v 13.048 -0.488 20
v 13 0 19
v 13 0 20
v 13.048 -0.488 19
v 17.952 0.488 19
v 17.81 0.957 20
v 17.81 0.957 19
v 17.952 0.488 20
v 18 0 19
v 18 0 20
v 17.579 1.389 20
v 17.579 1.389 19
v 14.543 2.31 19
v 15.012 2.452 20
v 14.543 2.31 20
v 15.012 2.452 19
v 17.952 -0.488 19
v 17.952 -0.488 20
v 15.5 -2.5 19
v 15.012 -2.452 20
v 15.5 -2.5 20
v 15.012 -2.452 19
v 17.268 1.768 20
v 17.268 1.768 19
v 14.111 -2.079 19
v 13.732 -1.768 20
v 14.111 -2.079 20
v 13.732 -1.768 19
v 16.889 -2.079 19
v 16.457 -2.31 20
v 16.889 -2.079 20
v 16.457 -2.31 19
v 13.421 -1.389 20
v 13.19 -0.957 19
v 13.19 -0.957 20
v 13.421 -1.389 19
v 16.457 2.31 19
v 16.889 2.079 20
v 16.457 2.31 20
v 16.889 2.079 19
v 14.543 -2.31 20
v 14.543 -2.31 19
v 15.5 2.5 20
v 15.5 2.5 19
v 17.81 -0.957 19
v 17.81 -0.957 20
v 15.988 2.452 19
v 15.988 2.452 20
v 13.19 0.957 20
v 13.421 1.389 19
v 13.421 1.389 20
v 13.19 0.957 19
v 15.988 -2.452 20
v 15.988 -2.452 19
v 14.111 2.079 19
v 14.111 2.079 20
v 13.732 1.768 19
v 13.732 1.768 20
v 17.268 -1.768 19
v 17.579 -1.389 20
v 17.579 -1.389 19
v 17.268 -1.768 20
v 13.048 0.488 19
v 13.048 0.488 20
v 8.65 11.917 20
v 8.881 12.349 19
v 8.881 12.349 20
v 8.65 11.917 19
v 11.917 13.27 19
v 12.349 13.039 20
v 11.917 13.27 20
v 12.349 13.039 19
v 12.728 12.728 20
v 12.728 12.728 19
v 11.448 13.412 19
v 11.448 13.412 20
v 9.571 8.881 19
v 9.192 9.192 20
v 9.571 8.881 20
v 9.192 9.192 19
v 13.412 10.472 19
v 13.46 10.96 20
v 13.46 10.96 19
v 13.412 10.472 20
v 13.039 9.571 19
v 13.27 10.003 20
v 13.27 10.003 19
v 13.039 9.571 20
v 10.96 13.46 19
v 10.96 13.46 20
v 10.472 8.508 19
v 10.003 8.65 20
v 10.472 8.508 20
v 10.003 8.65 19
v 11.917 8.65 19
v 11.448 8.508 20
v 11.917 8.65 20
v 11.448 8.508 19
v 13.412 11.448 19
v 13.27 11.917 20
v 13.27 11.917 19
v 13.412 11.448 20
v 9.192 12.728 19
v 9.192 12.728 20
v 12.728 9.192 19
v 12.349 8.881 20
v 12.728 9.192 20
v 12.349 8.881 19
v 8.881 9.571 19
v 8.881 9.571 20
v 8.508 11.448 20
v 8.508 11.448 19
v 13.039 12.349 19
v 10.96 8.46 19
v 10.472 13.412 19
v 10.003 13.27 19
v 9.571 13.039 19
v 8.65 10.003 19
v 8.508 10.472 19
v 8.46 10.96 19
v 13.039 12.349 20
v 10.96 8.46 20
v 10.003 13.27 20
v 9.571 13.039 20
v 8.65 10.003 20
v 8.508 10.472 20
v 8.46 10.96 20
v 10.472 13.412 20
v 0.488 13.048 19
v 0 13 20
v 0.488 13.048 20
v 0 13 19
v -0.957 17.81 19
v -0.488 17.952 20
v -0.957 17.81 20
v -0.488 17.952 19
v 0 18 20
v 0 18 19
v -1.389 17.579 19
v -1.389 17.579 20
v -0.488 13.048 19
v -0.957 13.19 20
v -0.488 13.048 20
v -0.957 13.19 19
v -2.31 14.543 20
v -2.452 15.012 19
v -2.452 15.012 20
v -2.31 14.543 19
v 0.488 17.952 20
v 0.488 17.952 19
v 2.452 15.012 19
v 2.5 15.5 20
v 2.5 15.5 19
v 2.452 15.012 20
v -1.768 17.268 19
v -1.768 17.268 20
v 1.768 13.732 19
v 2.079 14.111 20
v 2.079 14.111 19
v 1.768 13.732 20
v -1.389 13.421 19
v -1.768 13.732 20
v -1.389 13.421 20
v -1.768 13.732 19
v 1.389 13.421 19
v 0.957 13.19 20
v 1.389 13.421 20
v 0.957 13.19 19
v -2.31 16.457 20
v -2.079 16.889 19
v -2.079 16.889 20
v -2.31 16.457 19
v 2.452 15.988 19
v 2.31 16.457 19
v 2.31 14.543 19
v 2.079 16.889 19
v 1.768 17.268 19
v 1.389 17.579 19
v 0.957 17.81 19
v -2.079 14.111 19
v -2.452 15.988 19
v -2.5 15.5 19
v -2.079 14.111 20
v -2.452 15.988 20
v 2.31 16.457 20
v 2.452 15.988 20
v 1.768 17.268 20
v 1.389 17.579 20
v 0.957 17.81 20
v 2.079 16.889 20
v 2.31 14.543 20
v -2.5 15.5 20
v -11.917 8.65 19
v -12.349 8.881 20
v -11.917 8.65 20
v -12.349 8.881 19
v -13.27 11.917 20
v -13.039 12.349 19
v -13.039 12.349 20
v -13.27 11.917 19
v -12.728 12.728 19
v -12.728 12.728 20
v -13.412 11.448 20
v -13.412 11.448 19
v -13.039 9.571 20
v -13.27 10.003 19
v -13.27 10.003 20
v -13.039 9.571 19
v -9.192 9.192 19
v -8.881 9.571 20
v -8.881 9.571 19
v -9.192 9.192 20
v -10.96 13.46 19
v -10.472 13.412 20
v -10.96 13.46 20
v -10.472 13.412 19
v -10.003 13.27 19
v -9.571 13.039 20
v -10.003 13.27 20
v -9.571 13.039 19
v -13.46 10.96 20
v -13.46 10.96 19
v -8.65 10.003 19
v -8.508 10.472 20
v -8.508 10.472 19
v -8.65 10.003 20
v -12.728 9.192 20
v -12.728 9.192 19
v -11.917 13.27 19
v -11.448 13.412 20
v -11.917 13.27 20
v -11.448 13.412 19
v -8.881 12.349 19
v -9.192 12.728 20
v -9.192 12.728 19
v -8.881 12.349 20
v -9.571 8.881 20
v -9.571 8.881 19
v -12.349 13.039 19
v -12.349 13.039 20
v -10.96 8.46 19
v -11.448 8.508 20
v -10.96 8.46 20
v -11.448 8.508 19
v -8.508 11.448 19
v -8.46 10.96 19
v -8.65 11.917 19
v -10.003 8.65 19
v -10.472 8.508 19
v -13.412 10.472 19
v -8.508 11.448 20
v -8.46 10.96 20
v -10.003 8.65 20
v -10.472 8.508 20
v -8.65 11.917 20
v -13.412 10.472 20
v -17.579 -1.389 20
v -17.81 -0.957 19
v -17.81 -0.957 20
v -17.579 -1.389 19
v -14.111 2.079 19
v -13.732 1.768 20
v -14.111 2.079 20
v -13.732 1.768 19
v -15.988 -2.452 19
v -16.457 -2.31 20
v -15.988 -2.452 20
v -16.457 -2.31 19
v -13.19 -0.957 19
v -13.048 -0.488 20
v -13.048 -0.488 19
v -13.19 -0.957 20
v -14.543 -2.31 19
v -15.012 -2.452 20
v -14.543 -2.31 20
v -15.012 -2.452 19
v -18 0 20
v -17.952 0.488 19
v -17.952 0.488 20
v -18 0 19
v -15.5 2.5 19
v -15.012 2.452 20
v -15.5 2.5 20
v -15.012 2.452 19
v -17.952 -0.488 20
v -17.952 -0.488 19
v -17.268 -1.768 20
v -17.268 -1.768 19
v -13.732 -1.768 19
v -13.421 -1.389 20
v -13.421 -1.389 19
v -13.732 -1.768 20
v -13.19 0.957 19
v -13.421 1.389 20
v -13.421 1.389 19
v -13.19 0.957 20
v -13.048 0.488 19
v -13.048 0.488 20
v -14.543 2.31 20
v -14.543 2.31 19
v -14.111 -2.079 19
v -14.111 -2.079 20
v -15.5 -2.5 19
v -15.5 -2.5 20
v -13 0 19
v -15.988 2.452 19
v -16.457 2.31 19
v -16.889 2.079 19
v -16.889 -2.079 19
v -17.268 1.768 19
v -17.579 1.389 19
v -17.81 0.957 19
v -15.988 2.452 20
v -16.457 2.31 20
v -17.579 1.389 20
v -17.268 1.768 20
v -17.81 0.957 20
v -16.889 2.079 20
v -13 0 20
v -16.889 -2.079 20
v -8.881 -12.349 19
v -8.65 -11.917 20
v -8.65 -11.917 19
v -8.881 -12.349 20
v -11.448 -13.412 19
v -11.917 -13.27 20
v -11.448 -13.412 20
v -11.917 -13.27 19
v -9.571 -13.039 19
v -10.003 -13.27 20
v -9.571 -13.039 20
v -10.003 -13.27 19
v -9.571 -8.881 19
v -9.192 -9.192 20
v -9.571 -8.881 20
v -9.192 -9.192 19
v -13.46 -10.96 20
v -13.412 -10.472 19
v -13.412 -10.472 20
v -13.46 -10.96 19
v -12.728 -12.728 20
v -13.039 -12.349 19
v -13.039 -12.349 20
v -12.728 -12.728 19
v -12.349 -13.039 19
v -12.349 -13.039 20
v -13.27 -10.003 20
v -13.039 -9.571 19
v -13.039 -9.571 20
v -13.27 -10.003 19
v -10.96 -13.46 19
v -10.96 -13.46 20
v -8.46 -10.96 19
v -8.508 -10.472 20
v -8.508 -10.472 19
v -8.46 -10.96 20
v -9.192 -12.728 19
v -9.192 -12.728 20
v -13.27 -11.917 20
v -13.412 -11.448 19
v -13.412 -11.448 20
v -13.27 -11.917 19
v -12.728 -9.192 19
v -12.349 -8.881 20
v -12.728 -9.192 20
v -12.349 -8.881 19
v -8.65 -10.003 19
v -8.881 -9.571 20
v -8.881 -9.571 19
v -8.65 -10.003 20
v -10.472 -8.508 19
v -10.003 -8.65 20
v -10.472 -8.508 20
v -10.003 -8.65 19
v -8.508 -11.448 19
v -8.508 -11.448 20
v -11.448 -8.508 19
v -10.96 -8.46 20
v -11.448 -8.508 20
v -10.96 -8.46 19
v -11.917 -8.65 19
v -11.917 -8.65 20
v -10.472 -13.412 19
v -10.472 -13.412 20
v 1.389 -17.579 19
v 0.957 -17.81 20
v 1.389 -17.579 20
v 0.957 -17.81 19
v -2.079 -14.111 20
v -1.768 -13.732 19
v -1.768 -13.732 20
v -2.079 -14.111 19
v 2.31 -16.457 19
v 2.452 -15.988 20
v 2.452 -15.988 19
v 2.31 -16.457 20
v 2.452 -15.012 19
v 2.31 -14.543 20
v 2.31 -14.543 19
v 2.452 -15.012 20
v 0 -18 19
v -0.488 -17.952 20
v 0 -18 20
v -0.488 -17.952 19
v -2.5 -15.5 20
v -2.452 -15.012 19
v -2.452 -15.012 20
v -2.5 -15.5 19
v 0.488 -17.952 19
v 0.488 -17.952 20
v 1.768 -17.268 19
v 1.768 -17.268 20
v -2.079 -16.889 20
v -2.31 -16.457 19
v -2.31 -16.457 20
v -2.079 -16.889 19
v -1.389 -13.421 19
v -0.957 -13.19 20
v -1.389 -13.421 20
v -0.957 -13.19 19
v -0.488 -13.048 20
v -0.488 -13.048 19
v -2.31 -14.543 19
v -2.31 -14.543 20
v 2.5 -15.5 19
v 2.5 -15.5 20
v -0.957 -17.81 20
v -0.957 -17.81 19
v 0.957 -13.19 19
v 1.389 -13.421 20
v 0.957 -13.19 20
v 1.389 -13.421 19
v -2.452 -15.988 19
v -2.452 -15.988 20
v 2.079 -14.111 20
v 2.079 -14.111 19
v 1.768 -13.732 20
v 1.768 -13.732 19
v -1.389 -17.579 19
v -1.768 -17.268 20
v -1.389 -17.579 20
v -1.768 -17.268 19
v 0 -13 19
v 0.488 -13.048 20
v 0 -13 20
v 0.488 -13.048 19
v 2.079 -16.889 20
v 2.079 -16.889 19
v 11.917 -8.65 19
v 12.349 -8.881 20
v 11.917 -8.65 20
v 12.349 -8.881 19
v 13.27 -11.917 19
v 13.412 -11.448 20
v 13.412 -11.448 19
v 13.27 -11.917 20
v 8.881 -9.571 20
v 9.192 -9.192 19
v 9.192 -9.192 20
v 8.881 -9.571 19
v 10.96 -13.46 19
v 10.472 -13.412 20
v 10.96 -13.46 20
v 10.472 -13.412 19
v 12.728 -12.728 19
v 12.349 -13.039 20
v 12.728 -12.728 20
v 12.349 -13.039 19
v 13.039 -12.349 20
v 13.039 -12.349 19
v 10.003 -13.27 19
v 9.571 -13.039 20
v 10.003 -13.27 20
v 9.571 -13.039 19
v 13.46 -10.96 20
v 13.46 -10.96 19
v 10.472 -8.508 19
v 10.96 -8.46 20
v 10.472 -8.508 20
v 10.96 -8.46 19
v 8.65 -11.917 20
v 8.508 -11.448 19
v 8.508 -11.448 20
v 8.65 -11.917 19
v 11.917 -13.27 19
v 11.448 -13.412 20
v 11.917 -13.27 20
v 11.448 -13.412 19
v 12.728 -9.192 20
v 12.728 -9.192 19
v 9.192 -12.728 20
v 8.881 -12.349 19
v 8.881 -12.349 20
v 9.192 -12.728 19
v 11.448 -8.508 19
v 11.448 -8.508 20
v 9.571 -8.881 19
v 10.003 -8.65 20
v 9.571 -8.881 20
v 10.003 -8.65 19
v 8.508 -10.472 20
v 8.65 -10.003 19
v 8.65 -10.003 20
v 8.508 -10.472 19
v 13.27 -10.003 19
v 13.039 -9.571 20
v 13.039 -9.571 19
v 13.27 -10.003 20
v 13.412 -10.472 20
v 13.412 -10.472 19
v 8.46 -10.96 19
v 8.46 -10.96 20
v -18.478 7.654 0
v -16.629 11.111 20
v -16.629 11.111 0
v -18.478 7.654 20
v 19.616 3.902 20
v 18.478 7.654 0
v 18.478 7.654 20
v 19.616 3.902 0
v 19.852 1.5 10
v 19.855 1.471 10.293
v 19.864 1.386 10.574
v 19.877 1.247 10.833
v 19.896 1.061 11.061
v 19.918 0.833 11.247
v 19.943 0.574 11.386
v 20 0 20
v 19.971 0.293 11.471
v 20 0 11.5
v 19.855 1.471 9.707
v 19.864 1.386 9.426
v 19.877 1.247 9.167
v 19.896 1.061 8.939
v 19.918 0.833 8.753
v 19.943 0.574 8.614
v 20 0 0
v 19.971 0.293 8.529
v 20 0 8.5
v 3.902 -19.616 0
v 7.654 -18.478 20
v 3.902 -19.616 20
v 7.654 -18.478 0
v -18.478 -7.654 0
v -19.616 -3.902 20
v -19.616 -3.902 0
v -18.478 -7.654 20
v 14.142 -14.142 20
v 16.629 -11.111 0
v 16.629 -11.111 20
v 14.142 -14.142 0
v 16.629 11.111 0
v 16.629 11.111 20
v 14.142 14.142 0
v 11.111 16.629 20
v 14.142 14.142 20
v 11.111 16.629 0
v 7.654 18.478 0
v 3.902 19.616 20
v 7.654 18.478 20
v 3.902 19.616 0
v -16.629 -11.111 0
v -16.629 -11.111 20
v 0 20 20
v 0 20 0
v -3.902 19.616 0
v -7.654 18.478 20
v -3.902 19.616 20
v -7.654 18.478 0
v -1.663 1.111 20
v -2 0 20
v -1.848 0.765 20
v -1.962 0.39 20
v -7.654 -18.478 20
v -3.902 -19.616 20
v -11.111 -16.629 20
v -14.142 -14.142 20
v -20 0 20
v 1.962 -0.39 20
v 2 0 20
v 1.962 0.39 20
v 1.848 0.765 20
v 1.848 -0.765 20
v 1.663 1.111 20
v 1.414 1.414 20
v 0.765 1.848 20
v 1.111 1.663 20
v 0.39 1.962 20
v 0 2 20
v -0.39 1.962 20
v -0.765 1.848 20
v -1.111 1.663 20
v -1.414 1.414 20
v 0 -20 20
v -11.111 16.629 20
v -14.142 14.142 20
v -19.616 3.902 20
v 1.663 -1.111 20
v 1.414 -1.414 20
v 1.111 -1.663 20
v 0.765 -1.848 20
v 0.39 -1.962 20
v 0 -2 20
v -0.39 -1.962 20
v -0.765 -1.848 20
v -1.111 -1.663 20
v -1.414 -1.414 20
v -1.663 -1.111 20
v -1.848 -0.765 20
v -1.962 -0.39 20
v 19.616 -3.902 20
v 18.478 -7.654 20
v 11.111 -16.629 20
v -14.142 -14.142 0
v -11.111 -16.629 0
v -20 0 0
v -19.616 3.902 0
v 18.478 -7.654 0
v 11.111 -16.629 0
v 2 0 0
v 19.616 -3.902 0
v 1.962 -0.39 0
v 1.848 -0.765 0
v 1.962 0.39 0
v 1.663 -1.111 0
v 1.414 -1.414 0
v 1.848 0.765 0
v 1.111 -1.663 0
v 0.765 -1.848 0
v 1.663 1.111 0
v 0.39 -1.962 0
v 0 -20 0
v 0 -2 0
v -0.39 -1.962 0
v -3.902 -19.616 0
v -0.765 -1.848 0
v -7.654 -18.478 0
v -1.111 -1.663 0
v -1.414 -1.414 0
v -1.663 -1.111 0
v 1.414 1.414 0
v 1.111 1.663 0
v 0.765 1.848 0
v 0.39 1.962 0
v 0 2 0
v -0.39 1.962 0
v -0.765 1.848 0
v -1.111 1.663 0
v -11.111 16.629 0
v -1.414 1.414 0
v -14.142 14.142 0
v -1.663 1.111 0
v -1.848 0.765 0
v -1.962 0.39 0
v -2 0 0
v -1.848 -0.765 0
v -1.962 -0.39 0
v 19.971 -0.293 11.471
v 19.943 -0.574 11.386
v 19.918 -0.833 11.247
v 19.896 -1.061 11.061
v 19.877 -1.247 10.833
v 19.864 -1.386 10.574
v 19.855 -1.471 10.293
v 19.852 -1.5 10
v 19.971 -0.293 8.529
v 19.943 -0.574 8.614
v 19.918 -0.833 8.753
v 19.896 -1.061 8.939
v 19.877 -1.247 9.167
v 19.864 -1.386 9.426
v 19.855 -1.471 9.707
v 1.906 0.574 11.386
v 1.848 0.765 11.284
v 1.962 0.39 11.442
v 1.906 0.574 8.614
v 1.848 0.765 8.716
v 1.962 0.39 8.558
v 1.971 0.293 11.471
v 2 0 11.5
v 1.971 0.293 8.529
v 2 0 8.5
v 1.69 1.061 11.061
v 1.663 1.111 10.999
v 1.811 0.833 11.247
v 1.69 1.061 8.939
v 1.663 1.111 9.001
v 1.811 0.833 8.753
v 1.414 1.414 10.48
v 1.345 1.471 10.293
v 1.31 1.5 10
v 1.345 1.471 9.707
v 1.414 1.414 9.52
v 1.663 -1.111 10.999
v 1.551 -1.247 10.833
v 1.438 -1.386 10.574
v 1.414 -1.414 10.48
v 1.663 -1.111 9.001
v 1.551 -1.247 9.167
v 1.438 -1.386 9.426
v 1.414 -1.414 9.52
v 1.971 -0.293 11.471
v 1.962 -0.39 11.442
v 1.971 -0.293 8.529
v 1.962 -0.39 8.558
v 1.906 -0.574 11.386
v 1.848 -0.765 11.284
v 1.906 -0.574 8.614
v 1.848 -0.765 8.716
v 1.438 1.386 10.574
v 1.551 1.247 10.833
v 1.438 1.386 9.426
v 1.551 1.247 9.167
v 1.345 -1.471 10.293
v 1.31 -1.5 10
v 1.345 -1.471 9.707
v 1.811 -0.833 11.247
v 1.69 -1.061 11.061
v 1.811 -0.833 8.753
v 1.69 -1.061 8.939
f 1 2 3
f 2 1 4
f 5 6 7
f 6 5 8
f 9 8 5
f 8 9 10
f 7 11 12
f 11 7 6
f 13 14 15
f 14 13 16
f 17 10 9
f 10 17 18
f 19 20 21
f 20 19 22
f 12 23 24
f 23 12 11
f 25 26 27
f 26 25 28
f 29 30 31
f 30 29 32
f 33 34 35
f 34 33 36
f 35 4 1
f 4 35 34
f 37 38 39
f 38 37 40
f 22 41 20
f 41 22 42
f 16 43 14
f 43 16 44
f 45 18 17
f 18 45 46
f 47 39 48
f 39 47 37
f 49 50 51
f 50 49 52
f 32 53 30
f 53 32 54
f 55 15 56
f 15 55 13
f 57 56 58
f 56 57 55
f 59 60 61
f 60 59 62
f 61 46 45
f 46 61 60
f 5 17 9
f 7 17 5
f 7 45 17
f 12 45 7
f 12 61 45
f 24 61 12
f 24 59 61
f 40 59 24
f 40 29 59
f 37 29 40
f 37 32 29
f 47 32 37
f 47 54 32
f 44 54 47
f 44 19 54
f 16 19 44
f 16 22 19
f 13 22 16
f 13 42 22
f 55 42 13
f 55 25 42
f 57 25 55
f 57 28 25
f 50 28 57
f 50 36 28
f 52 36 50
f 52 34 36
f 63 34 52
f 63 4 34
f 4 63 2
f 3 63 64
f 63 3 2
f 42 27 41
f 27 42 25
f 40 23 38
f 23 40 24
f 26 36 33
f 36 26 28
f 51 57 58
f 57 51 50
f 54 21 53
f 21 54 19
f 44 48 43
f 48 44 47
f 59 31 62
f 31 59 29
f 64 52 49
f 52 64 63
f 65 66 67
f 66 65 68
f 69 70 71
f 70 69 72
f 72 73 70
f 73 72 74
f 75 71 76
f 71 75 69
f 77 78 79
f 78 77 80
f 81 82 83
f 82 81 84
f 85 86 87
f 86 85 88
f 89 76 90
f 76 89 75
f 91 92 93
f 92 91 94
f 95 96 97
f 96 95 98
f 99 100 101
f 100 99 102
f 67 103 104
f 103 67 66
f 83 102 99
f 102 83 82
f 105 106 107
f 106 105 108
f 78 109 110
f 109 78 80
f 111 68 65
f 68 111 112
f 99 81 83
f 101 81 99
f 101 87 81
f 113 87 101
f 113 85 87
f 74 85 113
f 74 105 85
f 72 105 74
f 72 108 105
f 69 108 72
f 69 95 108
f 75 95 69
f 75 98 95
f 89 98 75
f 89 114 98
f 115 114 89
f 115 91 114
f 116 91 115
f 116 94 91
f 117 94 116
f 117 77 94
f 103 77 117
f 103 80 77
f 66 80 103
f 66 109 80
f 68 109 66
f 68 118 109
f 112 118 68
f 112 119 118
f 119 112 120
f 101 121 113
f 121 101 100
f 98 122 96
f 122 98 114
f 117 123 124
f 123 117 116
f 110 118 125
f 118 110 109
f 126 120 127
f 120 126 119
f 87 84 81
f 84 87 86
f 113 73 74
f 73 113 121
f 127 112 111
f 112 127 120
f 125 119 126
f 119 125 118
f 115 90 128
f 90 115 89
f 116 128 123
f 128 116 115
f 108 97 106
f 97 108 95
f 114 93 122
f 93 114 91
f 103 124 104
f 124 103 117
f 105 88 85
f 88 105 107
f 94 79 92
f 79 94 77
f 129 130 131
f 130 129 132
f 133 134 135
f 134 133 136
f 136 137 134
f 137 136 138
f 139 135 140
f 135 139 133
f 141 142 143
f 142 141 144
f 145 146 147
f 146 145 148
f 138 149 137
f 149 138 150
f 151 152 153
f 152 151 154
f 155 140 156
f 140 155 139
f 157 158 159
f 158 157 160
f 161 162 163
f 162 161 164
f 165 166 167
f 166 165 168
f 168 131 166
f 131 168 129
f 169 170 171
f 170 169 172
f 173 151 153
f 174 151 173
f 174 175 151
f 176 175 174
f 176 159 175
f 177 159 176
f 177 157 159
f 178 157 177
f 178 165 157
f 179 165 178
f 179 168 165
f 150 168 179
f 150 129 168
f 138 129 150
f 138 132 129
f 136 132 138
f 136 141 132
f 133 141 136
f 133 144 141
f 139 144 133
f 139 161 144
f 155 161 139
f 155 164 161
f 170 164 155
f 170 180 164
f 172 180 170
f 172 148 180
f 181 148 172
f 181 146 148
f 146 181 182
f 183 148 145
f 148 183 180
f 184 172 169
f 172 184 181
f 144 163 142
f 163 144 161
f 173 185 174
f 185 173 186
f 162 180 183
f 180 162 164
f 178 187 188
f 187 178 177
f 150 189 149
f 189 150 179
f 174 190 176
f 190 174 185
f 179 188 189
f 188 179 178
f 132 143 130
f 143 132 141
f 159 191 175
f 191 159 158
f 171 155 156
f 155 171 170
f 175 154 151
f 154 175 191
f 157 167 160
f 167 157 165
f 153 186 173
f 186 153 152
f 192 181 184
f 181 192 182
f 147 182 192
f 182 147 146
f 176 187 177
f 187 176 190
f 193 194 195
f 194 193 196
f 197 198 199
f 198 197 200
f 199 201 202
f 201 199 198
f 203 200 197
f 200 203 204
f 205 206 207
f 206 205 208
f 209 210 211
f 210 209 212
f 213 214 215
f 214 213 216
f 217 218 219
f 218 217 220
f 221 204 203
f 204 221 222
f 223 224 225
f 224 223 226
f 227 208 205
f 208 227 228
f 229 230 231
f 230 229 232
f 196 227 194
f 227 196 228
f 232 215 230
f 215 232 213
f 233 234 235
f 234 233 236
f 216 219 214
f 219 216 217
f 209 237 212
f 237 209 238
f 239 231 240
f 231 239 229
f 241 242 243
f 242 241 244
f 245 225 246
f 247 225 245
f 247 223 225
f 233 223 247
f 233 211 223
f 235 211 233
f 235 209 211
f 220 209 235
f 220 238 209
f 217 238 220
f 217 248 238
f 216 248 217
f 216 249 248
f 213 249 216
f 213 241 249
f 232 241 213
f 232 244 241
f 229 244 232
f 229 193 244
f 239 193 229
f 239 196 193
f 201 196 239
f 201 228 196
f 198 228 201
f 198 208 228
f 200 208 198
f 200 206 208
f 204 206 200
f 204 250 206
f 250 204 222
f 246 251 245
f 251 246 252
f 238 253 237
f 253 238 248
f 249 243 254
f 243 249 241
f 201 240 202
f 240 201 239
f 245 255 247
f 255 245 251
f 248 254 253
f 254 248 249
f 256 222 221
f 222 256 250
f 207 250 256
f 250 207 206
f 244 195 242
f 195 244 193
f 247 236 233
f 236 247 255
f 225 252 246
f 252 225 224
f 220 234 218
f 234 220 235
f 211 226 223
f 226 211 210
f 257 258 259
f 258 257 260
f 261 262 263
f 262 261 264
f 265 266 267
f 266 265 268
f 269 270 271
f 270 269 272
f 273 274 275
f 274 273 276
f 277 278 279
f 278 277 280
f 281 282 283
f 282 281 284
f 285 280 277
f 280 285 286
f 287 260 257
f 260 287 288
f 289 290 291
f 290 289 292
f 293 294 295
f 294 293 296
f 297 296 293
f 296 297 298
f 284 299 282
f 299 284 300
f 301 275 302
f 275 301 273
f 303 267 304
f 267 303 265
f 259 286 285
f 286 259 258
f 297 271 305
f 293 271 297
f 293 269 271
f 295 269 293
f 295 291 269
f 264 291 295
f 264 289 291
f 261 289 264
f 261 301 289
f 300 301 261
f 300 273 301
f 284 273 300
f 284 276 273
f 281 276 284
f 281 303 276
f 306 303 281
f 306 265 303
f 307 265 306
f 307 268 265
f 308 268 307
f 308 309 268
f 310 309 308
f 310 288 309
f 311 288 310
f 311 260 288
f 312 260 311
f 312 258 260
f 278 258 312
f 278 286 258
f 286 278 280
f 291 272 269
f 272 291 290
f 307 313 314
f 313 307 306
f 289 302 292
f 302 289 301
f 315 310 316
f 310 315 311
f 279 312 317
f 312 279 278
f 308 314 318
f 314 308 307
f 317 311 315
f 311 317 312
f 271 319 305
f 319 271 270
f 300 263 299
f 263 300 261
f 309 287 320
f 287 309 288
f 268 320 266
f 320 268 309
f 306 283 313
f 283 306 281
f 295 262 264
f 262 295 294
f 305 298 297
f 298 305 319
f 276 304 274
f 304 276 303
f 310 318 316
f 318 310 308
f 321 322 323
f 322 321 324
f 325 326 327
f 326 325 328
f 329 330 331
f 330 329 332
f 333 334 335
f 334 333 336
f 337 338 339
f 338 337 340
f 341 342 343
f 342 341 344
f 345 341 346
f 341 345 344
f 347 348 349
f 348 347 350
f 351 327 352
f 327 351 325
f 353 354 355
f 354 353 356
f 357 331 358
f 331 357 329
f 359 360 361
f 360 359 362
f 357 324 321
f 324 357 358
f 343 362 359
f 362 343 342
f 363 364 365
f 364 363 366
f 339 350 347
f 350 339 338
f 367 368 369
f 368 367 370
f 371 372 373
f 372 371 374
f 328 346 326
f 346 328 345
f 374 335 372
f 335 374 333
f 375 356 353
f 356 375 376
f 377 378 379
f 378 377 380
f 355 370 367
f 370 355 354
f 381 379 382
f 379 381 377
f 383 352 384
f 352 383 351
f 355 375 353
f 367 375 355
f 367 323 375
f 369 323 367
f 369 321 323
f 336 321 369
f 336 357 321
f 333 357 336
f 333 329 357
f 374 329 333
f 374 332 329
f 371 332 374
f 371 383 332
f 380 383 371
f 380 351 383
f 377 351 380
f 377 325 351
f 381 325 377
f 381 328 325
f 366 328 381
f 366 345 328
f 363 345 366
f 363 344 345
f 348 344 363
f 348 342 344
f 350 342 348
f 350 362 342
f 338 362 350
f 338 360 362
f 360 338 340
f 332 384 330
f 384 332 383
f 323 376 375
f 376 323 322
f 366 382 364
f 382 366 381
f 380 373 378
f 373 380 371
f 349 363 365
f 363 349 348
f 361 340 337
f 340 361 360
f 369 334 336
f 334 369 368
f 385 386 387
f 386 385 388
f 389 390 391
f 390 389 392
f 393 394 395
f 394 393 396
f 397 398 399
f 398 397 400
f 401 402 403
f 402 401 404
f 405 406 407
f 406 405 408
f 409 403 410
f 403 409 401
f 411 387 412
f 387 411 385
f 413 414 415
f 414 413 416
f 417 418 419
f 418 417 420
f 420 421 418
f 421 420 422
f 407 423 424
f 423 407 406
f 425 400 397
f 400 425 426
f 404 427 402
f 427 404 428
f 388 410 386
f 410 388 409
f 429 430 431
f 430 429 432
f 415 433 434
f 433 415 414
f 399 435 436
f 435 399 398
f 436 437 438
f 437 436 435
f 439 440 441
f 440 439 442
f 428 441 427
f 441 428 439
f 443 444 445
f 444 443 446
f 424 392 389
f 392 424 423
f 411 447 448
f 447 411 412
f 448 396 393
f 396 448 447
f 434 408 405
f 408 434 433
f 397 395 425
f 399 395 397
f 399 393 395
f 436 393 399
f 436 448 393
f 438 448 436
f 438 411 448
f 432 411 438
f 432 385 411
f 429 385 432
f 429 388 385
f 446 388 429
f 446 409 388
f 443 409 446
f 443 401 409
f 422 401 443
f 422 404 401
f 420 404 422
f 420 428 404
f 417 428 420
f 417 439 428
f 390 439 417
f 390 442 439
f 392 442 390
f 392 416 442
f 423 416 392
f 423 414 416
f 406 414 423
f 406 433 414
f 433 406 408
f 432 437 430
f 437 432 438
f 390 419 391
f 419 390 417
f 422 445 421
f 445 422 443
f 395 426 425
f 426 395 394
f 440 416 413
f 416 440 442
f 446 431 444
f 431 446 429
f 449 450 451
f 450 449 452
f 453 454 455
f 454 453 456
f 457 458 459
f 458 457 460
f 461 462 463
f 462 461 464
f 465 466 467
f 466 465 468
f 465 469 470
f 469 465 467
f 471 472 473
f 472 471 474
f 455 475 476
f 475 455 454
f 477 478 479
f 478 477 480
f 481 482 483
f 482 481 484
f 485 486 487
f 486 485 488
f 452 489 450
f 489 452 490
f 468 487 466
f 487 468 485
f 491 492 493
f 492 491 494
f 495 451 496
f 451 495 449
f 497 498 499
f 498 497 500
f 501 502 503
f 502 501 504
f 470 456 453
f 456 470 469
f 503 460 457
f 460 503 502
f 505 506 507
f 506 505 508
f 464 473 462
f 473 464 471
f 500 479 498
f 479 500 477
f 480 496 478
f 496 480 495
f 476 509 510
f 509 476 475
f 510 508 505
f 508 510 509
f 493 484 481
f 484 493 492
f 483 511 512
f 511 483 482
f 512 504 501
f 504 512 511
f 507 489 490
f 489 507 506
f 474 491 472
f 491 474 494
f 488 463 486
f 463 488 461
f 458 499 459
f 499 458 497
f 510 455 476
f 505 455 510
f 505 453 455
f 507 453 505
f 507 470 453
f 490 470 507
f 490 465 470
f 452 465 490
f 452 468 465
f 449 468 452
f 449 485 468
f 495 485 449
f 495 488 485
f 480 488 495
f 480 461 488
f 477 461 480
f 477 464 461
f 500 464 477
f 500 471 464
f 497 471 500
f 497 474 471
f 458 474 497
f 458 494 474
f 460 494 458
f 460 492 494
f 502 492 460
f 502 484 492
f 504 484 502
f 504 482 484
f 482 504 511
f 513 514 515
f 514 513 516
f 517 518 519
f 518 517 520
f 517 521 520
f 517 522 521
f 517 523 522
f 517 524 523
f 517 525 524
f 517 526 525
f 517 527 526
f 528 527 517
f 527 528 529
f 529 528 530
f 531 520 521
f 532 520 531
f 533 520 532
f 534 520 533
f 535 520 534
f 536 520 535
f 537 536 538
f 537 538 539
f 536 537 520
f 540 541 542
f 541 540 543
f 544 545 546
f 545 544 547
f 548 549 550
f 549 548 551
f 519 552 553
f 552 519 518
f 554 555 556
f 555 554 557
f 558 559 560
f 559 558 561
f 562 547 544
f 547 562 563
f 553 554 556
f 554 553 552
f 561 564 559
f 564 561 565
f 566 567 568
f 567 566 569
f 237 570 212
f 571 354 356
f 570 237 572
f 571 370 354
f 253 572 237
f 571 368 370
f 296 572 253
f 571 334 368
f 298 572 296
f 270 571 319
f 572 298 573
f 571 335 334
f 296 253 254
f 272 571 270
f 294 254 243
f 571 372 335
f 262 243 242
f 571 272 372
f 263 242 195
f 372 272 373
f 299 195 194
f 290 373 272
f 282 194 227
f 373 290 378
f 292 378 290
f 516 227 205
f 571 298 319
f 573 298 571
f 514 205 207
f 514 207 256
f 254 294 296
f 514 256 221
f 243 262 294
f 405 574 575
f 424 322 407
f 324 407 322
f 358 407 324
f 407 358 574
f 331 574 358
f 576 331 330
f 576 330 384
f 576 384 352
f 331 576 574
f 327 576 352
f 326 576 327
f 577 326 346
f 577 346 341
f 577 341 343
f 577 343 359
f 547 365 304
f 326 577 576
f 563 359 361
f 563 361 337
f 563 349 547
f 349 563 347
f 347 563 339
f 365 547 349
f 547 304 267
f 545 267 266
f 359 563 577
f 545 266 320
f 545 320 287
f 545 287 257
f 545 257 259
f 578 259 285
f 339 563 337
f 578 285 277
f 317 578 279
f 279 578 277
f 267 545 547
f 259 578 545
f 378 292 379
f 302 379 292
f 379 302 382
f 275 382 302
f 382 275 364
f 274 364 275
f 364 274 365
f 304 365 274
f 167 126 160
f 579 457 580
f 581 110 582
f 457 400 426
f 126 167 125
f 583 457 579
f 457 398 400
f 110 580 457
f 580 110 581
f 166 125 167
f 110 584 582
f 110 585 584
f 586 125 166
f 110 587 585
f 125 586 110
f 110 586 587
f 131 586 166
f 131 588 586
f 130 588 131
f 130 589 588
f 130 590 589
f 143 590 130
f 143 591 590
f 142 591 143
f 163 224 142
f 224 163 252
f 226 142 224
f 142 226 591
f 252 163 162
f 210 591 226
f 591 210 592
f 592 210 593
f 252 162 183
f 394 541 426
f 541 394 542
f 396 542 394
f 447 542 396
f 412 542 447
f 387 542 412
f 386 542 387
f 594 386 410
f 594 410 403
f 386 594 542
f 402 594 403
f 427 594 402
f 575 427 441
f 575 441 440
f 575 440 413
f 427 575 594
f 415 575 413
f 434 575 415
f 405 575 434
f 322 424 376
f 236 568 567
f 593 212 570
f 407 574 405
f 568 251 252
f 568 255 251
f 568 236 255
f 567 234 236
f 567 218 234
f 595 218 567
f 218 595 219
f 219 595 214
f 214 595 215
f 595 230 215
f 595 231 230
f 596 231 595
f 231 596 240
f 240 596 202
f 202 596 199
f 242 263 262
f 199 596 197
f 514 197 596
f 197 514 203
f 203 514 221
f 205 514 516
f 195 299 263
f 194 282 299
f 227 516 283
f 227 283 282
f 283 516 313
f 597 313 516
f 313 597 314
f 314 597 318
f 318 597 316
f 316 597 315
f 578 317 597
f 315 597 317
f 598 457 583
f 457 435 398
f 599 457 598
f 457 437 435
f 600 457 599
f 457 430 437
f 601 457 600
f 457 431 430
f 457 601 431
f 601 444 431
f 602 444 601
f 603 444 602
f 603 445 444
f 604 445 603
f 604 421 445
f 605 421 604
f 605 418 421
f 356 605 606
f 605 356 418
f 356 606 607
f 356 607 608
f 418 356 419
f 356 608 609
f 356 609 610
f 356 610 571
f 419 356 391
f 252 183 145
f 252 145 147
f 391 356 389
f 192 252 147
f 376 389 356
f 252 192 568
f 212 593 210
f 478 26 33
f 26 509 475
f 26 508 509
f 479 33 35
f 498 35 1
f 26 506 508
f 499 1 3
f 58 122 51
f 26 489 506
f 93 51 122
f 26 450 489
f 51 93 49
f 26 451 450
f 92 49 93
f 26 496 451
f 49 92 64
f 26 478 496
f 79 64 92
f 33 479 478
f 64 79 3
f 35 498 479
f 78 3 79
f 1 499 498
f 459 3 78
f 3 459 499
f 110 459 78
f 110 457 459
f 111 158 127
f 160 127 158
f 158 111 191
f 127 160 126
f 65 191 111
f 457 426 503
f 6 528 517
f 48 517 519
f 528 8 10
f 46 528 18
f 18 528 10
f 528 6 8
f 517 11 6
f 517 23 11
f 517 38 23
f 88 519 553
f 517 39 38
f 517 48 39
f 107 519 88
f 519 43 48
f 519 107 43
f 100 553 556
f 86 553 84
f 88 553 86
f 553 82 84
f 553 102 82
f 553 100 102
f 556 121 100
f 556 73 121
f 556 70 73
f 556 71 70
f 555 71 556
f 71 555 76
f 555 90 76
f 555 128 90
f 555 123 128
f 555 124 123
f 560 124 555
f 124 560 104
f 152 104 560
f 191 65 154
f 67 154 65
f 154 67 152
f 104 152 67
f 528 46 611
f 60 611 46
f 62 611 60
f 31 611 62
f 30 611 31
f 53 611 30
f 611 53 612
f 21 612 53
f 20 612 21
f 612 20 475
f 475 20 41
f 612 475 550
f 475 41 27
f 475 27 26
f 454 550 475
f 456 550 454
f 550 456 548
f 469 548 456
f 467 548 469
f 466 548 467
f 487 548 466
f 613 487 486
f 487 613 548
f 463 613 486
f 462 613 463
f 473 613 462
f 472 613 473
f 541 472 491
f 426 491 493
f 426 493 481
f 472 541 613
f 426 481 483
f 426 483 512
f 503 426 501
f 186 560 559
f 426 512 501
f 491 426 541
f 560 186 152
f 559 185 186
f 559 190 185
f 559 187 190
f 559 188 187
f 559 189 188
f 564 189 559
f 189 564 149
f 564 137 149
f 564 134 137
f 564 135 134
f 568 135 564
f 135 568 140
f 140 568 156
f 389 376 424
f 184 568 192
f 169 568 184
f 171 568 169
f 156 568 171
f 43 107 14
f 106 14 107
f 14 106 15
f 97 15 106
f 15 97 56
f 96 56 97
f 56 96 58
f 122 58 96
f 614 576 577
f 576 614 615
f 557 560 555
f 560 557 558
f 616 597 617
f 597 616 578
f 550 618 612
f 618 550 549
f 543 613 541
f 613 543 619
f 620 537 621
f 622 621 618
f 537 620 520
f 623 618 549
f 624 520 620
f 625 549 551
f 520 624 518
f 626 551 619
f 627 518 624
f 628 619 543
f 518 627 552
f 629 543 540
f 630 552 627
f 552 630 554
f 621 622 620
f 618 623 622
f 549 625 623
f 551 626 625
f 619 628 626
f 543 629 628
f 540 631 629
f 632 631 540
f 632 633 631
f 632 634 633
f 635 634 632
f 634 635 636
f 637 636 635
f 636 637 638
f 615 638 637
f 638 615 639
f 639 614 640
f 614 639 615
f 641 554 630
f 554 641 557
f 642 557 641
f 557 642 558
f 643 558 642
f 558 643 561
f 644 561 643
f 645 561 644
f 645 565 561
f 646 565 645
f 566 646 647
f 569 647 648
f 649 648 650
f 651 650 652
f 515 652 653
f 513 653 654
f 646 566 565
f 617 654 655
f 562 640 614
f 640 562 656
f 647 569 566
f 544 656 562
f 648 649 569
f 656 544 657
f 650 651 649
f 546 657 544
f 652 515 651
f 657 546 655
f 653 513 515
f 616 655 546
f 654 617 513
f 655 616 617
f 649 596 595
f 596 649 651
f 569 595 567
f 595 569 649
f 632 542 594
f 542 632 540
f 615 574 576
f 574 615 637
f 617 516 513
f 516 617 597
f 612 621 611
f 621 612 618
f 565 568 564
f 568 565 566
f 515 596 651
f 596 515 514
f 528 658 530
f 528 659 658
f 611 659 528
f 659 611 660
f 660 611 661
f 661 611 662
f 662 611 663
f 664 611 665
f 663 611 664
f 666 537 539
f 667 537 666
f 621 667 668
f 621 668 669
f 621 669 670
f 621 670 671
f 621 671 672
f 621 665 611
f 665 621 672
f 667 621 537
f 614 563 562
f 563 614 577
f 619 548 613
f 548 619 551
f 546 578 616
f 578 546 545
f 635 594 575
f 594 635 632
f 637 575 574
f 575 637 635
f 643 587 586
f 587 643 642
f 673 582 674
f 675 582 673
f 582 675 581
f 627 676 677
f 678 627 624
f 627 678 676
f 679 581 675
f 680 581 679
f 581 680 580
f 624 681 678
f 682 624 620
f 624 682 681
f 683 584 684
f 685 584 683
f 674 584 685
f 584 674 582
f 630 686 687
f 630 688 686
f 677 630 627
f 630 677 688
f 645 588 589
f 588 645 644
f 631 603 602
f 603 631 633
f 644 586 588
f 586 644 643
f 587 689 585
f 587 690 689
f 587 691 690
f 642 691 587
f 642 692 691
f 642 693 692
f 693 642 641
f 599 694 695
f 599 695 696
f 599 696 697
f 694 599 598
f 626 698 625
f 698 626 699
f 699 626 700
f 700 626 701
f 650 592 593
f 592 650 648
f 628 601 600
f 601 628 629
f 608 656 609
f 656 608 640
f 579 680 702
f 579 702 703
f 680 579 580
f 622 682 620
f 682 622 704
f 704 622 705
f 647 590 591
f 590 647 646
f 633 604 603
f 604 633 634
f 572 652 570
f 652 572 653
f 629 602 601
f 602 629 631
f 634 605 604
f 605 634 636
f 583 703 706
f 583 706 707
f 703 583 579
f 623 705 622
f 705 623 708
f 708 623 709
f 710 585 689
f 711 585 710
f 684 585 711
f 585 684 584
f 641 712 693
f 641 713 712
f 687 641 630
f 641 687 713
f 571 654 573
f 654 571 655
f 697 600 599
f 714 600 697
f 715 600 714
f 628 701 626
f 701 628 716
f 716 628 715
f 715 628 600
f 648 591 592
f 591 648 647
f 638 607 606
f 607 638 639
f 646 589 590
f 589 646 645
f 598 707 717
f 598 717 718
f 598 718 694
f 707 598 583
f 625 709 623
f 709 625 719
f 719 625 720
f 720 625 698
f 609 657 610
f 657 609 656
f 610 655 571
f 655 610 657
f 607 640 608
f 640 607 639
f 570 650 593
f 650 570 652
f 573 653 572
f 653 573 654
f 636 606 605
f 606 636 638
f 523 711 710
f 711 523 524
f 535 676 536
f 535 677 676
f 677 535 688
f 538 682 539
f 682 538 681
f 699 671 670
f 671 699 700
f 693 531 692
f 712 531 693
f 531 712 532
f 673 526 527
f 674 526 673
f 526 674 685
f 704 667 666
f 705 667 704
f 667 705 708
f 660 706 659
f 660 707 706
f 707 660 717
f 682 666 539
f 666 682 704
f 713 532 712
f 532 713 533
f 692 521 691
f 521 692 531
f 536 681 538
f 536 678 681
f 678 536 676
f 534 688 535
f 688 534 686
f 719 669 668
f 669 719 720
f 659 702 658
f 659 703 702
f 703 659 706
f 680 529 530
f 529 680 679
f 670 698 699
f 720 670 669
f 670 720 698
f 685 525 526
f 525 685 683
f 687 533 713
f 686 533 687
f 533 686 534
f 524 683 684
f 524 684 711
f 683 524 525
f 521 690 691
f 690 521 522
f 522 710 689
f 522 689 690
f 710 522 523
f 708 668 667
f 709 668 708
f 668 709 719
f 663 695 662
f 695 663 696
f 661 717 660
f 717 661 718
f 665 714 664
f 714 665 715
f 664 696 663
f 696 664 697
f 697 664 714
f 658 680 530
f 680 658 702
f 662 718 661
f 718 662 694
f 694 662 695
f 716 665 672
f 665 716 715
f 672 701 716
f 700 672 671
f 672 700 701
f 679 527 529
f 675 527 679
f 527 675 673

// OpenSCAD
$fn = 32;

// ----------------------------------------------------------------------
// Control knob: dimpled knob
// ----------------------------------------------------------------------

// --- parameters (mm) ---
dimp_d = 5;               // finger dimple diameter
n_dimp = 8;               // number of dimples
dimp_r = 15.5;            // dimple ring radius
knob_d = 40;              // knob body diameter
knob_h = 20;              // knob body height
bore_d = 4;               // shaft bore diameter
set_d = 3;                // set screw bore diameter

dimp_step = 360 / n_dimp;  // dimple angular step

difference() {
  cylinder(h = knob_h, d = knob_d);
  translate([0, 0, -1]) cylinder(h = knob_h + 2, d = bore_d);
  translate([-1, 0, knob_h / 2]) rotate([0, 90, 0])
    cylinder(h = knob_d / 2 + bore_d / 2 + 2, d = set_d);  for (i = [0 : n_dimp - 1])
    rotate([0, 0, i * dimp_step])
      translate([dimp_r, 0, knob_h - 1])
        cylinder(h = 2, d = dimp_d);
}
